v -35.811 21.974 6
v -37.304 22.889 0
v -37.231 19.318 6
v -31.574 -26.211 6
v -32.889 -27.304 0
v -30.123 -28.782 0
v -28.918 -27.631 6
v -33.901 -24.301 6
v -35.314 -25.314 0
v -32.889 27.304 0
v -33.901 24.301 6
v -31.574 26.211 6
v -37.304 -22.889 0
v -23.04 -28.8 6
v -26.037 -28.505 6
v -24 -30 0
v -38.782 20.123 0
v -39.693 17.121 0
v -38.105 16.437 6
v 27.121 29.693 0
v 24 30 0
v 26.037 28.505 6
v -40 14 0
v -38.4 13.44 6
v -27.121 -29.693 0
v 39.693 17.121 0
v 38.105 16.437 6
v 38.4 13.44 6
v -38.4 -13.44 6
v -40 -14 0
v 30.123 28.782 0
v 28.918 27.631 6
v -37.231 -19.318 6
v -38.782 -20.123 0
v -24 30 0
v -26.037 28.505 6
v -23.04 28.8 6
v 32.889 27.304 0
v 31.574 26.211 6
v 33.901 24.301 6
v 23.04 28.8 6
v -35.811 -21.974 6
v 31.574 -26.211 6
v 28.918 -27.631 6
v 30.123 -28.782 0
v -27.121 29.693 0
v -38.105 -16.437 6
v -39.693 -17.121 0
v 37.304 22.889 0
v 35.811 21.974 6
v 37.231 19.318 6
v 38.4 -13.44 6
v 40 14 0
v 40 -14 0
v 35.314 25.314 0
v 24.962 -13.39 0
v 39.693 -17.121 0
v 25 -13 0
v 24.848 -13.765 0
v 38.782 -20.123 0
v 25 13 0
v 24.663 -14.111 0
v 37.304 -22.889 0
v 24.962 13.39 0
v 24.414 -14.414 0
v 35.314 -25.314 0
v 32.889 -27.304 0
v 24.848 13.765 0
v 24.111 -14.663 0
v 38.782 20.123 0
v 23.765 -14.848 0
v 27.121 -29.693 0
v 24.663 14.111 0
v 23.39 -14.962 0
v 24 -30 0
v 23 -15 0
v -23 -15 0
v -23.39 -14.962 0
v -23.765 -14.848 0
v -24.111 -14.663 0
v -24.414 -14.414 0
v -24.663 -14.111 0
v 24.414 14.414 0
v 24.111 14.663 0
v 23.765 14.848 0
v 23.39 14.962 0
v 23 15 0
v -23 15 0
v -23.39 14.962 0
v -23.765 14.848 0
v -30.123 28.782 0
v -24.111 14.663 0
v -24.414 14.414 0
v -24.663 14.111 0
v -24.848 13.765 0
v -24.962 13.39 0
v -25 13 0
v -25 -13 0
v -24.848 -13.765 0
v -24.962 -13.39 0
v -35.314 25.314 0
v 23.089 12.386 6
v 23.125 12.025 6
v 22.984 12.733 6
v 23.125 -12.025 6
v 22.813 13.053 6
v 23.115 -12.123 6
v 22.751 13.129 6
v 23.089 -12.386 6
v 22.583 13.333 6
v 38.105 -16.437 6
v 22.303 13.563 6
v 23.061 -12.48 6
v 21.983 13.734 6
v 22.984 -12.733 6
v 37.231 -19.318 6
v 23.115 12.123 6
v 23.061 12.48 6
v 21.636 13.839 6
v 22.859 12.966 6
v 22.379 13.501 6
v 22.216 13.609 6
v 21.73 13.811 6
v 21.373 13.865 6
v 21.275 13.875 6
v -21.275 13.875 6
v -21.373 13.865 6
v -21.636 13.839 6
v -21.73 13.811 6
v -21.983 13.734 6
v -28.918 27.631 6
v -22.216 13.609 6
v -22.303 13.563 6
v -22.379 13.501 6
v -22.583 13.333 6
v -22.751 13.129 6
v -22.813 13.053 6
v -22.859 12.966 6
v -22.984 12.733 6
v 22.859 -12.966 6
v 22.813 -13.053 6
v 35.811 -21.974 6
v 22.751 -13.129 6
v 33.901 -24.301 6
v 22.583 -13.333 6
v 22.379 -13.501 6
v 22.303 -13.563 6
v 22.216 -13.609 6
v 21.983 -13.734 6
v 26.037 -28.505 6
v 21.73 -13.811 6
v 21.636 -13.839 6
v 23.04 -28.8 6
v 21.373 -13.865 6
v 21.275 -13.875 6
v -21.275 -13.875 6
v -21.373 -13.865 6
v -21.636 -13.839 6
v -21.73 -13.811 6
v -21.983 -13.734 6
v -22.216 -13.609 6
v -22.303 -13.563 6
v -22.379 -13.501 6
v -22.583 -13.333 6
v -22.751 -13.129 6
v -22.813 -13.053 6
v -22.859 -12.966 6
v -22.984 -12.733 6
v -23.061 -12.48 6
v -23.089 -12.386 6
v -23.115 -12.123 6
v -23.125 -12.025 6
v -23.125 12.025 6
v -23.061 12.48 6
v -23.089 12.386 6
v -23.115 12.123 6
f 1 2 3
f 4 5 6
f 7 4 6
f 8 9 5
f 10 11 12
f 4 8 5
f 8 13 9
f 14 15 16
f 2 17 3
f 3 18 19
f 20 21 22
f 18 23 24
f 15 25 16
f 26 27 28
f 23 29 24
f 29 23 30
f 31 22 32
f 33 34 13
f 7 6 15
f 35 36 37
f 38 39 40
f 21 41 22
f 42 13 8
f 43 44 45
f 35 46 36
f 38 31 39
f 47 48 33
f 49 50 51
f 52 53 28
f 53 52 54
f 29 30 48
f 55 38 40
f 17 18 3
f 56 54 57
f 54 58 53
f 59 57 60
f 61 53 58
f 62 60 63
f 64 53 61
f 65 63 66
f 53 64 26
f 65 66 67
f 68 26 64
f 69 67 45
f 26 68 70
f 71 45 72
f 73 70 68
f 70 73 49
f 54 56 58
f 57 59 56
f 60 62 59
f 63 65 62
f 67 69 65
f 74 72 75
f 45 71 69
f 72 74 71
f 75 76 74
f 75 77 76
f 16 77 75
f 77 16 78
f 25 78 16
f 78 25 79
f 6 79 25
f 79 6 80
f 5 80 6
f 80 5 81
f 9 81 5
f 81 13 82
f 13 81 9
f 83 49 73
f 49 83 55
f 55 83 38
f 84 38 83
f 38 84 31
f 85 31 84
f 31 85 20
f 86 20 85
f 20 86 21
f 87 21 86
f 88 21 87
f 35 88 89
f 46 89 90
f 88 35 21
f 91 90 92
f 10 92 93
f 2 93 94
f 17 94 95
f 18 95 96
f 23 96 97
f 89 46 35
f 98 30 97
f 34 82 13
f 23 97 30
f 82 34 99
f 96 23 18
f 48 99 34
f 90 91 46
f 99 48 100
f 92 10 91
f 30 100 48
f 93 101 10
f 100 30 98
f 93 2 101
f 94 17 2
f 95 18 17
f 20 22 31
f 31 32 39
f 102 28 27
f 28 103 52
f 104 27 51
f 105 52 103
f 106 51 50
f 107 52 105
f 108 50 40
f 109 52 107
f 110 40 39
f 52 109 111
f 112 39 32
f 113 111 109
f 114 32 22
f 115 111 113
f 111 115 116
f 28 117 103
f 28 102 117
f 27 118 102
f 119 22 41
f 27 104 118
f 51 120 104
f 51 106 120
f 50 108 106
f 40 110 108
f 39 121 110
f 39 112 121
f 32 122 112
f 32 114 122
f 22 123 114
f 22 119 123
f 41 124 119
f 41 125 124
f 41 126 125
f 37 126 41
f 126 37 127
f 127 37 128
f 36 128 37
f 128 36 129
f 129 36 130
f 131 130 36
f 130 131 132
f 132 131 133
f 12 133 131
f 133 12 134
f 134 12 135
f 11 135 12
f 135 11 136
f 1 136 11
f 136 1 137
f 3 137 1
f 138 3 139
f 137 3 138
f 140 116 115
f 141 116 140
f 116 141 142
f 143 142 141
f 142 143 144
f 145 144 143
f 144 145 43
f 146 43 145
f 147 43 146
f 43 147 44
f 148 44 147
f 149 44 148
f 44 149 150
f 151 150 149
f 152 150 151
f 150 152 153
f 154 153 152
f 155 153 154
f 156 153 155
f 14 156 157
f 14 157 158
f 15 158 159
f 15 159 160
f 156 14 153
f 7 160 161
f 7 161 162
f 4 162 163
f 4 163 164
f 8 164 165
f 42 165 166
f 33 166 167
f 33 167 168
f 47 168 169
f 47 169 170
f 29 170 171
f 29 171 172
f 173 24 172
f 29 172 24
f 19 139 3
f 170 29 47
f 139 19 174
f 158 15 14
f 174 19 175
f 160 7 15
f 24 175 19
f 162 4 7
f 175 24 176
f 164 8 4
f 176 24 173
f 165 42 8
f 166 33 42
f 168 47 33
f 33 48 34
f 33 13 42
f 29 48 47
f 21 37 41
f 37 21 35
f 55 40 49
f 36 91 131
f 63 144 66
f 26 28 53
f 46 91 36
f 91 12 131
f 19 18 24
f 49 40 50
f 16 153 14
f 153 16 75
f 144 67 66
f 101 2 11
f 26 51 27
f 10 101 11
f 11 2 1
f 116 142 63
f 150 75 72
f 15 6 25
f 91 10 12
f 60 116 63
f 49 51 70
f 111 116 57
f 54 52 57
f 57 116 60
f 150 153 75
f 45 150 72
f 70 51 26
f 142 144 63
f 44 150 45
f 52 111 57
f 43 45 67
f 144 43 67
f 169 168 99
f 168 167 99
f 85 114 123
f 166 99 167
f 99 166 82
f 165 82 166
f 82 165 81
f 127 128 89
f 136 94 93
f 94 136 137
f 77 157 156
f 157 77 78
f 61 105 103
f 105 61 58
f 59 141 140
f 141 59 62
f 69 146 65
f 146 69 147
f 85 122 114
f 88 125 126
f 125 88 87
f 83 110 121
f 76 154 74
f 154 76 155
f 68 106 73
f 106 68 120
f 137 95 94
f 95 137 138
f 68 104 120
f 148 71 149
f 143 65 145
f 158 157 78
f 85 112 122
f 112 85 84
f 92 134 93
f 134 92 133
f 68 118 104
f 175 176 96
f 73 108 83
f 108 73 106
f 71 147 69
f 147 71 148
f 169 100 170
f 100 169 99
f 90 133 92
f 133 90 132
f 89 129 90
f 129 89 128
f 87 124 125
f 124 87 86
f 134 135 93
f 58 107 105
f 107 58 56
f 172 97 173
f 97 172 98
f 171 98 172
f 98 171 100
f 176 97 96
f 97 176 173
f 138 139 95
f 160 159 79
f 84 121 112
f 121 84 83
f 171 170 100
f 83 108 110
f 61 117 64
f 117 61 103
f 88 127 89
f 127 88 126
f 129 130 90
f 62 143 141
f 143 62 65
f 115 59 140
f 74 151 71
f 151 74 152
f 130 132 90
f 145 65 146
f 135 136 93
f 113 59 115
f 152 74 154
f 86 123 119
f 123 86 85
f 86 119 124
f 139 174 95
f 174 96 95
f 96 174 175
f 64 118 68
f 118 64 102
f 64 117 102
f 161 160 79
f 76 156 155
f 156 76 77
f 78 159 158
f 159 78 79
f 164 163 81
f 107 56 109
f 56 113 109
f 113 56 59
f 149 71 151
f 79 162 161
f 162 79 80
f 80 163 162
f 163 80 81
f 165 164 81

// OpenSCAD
$fn = 32;

// ----------------------------------------------------------------------
// Display bezel: 80 x 60 mm frame, opening 50x30 mm
// ----------------------------------------------------------------------

// --- parameters (mm) ---
length = 80;              // frame outside length, X
width = 60;               // frame outside width, Y
frame_w = 15;             // frame width
thickness = 6;            // frame thickness
corner_r = 16;            // outside corner radius
chamfer = 0.96;           // outer wall taper
funnel = 0.9;             // inner opening taper
opening_l = 50;           // opening length
opening_w = 30;           // opening width
inner_r = 2;              // opening corner radius

/* rounded-rectangle outlines, generated with loops */
module rounded_ring(l_nom, w_nom, r) {
  hull() {
    for (sx = [-1, 1]) for (sy = [-1, 1])
      translate([sx * (l_nom / 2 - r), sy * (w_nom / 2 - r)]) circle(r = r);
  }
}

difference() {
  /* frame body, drafted so the outer edge is a variable-depth chamfer */
  linear_extrude(height = thickness, scale = chamfer)
    rounded_ring(length, width, corner_r);
  /* viewing opening, drafted the other way for a funnel edge */
  linear_extrude(height = thickness + 2, scale = funnel)
    translate([0, 0, -1]) rounded_ring(opening_l, opening_w, inner_r);
}
